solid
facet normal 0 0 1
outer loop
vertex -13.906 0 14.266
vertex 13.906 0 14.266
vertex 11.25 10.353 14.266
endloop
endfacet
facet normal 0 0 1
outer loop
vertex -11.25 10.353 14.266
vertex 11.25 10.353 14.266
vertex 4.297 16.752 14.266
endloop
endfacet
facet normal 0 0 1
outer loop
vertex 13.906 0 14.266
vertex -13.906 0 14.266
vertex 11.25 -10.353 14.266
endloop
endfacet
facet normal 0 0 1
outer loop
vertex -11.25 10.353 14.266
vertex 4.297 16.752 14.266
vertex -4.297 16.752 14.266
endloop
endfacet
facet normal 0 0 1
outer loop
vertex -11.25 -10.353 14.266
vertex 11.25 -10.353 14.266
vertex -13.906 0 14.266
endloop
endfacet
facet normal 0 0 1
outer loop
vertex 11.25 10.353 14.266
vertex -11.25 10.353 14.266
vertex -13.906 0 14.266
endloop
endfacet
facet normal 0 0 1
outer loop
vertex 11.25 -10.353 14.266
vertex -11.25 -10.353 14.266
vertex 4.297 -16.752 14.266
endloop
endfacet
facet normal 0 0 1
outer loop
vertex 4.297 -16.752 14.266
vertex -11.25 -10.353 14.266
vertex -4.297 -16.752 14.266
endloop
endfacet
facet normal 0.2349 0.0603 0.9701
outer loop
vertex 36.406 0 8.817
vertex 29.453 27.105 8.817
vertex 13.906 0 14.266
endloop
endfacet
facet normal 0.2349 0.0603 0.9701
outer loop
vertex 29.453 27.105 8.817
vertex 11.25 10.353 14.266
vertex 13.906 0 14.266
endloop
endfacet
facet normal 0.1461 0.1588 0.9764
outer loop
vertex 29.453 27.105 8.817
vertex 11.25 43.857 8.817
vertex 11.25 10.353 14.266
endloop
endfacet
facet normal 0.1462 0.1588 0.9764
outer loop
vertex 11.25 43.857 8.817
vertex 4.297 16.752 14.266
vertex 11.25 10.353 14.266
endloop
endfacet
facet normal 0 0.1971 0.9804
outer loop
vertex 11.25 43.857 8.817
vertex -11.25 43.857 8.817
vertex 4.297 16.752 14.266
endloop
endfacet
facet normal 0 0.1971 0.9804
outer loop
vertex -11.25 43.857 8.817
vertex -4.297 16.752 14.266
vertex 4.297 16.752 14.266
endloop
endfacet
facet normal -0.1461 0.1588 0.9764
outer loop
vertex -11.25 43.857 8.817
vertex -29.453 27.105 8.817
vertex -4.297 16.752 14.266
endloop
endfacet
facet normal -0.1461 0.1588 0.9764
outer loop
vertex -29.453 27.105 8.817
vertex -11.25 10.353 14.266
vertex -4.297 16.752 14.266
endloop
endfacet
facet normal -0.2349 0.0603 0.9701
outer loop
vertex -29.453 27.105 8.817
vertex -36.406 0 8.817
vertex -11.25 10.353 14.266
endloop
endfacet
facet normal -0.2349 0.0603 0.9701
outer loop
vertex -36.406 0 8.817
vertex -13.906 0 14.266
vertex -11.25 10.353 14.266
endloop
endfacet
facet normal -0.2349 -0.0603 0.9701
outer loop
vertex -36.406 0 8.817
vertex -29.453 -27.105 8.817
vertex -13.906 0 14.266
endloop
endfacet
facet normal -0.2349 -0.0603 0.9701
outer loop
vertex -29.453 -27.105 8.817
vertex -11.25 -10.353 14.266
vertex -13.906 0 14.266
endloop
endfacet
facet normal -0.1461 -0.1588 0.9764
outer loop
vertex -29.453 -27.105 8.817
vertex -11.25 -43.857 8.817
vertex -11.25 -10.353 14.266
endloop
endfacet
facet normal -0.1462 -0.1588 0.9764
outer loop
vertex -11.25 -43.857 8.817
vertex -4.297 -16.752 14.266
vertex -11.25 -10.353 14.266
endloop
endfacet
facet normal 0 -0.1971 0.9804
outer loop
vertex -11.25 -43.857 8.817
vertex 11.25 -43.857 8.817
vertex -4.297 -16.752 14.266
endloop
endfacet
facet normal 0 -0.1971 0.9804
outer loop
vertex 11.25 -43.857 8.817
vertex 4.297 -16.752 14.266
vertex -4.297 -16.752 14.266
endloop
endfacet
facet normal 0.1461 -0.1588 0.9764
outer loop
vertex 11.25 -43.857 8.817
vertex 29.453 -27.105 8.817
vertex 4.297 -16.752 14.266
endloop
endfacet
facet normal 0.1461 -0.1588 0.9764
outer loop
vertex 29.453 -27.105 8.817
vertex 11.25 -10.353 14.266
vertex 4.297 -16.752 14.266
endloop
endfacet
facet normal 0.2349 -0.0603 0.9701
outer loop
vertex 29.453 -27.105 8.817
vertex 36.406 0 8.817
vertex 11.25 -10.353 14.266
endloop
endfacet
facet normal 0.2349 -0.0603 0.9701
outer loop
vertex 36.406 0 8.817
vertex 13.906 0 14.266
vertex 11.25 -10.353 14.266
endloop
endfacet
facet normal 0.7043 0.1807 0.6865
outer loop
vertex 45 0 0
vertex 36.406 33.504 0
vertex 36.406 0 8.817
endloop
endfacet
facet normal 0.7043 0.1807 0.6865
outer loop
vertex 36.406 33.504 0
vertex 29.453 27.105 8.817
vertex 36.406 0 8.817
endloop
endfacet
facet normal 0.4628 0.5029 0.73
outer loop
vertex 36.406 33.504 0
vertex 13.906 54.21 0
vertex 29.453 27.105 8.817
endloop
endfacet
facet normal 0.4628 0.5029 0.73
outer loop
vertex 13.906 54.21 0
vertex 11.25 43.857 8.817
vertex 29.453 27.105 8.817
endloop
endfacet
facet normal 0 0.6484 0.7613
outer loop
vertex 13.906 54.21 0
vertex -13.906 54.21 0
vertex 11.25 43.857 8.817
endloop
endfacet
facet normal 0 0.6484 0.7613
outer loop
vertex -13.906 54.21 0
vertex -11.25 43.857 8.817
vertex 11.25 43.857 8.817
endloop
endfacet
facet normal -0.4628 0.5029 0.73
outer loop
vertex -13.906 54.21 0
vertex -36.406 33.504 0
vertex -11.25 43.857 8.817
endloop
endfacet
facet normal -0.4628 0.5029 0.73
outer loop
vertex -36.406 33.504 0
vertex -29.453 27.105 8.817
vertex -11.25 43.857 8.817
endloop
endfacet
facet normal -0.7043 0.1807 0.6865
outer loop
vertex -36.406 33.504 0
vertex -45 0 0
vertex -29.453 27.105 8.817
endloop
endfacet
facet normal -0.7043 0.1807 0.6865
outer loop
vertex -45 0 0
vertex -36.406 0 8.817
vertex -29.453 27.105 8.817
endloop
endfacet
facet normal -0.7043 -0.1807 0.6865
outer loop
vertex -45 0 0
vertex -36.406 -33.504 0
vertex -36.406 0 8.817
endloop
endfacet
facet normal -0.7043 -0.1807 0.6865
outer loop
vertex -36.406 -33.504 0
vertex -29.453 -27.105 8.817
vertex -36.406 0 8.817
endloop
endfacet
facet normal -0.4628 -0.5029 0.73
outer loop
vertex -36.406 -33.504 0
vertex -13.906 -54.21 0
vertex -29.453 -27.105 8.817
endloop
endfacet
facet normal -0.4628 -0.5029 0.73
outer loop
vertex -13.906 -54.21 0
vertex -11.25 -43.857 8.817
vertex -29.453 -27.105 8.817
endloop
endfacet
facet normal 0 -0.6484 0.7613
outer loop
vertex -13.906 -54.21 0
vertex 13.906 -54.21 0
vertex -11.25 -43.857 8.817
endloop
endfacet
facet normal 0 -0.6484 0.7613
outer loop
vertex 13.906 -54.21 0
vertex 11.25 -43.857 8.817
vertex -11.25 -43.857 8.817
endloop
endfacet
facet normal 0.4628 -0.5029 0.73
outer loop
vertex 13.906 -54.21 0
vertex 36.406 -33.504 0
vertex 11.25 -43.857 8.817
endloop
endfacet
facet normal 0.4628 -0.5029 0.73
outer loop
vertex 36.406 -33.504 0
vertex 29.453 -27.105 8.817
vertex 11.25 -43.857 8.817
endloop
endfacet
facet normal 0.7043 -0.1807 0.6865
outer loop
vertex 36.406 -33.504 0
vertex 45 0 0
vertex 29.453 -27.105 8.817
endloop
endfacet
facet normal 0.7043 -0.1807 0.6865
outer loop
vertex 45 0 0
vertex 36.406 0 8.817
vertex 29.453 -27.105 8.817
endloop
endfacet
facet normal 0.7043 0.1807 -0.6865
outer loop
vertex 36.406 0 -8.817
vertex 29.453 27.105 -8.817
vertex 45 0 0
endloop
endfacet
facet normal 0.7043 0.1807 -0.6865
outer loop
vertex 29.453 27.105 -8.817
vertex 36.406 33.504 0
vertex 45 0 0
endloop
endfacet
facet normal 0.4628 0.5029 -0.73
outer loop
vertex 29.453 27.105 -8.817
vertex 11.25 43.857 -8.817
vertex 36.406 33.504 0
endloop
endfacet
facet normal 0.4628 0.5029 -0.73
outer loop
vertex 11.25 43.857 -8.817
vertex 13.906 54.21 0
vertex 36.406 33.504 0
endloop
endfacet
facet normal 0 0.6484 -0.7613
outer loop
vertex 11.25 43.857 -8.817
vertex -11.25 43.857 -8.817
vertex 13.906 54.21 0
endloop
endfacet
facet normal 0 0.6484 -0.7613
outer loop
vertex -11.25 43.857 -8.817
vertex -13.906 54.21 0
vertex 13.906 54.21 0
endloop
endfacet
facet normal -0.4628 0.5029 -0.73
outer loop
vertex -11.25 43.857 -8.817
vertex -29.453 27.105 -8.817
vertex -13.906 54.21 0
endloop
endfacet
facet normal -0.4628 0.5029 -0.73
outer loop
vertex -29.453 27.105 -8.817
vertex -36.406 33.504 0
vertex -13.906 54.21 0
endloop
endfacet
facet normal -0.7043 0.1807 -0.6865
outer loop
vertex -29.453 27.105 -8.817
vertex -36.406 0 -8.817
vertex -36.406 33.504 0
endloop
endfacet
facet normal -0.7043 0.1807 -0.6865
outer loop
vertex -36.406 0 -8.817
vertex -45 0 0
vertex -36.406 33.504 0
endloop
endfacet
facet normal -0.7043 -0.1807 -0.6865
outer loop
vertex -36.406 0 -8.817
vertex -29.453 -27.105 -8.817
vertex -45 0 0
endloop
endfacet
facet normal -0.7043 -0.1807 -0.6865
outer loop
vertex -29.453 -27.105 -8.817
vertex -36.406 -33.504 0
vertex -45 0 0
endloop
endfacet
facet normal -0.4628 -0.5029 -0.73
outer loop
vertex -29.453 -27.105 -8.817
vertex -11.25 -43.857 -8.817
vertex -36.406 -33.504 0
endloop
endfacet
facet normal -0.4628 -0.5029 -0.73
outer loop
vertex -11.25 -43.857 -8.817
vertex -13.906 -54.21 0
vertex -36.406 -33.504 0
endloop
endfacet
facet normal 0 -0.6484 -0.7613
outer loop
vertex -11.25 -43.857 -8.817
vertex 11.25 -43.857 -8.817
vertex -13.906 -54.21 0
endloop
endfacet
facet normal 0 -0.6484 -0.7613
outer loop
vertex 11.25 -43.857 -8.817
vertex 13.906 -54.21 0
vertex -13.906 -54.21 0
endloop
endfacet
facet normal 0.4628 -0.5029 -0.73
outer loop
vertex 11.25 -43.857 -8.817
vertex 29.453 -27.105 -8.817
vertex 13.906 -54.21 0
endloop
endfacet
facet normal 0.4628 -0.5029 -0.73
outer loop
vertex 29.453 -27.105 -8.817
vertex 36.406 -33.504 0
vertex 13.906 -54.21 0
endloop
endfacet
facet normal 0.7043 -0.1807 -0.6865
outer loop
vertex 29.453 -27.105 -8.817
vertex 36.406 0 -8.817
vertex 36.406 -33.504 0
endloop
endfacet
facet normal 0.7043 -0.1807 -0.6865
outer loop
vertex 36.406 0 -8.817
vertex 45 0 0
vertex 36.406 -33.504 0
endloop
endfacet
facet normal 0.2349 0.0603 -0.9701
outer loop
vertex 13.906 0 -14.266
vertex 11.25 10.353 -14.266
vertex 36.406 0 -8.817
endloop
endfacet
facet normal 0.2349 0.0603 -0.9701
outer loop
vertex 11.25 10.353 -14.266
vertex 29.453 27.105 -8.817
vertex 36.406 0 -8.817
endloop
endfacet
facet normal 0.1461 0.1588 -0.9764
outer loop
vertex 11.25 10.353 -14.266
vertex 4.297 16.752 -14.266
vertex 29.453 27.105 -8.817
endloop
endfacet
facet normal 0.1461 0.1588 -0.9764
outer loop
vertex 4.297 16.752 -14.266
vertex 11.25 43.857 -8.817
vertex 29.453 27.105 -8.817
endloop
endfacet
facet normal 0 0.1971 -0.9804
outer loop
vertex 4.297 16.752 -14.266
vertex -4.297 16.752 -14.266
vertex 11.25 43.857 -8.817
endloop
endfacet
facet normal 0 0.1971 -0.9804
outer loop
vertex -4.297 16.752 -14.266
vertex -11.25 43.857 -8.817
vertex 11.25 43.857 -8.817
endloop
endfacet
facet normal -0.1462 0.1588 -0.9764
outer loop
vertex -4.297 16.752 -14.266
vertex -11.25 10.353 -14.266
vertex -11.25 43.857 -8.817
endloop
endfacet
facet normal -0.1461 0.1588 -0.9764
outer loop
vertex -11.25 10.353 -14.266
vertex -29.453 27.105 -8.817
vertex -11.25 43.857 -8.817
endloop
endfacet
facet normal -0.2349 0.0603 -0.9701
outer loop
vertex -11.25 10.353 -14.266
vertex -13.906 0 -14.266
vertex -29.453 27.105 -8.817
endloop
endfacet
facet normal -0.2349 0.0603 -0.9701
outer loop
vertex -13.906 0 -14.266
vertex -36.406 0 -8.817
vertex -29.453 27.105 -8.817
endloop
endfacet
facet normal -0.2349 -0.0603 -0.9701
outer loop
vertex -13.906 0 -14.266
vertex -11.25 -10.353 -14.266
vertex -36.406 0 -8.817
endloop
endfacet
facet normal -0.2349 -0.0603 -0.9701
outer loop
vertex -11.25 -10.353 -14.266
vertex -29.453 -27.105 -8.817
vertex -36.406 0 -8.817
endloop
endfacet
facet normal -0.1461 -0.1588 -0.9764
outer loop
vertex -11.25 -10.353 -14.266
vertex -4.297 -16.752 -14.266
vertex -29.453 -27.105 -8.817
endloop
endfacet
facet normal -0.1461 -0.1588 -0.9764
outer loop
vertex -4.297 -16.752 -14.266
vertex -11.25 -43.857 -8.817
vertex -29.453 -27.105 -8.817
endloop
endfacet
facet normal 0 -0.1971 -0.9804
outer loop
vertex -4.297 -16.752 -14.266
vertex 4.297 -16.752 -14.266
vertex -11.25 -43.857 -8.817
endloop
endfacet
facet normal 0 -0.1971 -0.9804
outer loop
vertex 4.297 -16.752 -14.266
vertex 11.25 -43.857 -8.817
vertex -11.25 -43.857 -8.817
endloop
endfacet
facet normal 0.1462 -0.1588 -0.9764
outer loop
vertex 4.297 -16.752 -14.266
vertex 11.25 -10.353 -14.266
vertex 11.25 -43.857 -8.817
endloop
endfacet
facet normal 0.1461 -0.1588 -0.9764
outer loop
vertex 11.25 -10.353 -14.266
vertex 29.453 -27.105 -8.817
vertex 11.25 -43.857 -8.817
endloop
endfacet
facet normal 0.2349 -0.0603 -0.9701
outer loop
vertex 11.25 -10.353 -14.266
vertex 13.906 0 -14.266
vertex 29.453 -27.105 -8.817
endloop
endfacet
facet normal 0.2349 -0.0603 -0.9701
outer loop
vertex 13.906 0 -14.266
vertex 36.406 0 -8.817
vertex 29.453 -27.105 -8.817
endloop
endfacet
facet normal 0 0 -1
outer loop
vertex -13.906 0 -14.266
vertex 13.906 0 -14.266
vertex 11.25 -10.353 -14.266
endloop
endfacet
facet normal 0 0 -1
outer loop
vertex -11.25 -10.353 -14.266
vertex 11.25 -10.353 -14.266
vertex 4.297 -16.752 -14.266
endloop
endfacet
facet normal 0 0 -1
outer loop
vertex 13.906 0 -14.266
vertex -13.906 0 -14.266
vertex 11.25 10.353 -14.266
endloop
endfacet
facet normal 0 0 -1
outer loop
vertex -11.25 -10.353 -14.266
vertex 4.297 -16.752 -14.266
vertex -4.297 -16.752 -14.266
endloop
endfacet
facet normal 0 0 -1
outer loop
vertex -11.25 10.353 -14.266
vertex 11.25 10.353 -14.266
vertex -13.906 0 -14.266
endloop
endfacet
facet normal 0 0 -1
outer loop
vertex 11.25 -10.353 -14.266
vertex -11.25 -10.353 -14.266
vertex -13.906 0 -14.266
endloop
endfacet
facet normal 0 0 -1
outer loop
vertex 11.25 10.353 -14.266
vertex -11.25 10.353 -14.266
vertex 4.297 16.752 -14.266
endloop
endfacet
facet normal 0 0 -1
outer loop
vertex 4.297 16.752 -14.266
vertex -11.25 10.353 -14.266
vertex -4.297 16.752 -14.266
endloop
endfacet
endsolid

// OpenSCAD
// Generated by SolidPython 1.0.1 on 2020-07-29 00:46:52


scale(v = [15, 19, 5]) {
	sphere(r = 3);
}
/***********************************************
*********      SolidPython code:      **********
************************************************
 
# import packages: SolidPython
from solid import *
from solid.utils import *
from itertools import chain, combinations, permutations


class Resize:

    def __init__(self, scad_file):
        self.scad_file = scad_file
        #self.scad_file = import_scad(scad_file)
        # cone/cylinder param:
        self.r1 = 0
        self.r2 = 0
        self.h = 0
        # rectangular prism param:
        self.w = 0
        self.l = 0
        # ellipse param:
        self.r = 0

    # import OpenScad code (file name corresponds to shape)


    # classify shape + parameters
    def assign(self, param1, param2, param3):
        if self.scad_file == 'cone.scad':
            self.r1 = param1
            self.r2 = param2
            self.h = param3
        elif self.scad_file == 'cylinder.scad':
            self.r1 = param1
            self.r2 = param2
            self.h = param3
        elif self.scad_file == 'rectangularPrism.scad':
            self.h = param1
            self.l = param2
            self.w = param3
        else:
            self.r = param1
            self.h = param2

    # resize parameters
    def iterate(self):
        x = range(3, 20, 2)
        i = 1
        if self.scad_file == 'cone.scad':
            tempList = list(permutations(x, 2))
            for temp in tempList:
                param1 = temp[0]
                param2 = temp[1]
                filepath = 'produced_scad_files/' + 'cone' + str(param1) + '_' + str(param2) + '_' + '.scad'
                scad_render_to_file(cylinder(h=param1, r1=param2, r2=0), filepath)

        elif self.scad_file == 'cylinder.scad':
            tempList = list(permutations(x, 3))
            for temp in tempList:
                param1 = temp[0]
                param2 = temp[1]
                filepath = 'produced_scad_files/' + 'cylinder' + str(param1) + '_' + str(param2) + '_' + '.scad'
                scad_render_to_file(cylinder(h=param1, r1=param2, r2=param2), filepath)

        elif self.scad_file == 'rectangularPrism.scad':
            tempList = list(permutations(x, 3))
            for temp in tempList:
                param1 = temp[0]
                param2 = temp[1]
                param3 = temp[2]
                filepath = 'produced_scad_files/' + 'rectangularPrism' + str(param1) + '_' + str(param2) + '_' + str(
                    param3) + '.scad'
                scad_render_to_file(cube(size=(param1, param2, param3)), filepath)

        elif self.scad_file == 'ellipse.scad':
            tempList = list(permutations(x, 4))
            for temp in tempList:
                param1 = temp[0]
                param2 = temp[1]
                param3 = temp[2]
                param4 = temp[3]
                filepath = 'produced_scad_files/' + 'ellipse' + str(param1) + '_' + str(param2) + '_' + str(param3) + '_' + str(param4) + '.scad'
                scad_render_to_file(scale([param1, param2, param3])(sphere(r=param4)), filepath)

    def render_to_scadfile(self):
        scad_render_to_file(scad, 'example.scad') 
 
************************************************/
